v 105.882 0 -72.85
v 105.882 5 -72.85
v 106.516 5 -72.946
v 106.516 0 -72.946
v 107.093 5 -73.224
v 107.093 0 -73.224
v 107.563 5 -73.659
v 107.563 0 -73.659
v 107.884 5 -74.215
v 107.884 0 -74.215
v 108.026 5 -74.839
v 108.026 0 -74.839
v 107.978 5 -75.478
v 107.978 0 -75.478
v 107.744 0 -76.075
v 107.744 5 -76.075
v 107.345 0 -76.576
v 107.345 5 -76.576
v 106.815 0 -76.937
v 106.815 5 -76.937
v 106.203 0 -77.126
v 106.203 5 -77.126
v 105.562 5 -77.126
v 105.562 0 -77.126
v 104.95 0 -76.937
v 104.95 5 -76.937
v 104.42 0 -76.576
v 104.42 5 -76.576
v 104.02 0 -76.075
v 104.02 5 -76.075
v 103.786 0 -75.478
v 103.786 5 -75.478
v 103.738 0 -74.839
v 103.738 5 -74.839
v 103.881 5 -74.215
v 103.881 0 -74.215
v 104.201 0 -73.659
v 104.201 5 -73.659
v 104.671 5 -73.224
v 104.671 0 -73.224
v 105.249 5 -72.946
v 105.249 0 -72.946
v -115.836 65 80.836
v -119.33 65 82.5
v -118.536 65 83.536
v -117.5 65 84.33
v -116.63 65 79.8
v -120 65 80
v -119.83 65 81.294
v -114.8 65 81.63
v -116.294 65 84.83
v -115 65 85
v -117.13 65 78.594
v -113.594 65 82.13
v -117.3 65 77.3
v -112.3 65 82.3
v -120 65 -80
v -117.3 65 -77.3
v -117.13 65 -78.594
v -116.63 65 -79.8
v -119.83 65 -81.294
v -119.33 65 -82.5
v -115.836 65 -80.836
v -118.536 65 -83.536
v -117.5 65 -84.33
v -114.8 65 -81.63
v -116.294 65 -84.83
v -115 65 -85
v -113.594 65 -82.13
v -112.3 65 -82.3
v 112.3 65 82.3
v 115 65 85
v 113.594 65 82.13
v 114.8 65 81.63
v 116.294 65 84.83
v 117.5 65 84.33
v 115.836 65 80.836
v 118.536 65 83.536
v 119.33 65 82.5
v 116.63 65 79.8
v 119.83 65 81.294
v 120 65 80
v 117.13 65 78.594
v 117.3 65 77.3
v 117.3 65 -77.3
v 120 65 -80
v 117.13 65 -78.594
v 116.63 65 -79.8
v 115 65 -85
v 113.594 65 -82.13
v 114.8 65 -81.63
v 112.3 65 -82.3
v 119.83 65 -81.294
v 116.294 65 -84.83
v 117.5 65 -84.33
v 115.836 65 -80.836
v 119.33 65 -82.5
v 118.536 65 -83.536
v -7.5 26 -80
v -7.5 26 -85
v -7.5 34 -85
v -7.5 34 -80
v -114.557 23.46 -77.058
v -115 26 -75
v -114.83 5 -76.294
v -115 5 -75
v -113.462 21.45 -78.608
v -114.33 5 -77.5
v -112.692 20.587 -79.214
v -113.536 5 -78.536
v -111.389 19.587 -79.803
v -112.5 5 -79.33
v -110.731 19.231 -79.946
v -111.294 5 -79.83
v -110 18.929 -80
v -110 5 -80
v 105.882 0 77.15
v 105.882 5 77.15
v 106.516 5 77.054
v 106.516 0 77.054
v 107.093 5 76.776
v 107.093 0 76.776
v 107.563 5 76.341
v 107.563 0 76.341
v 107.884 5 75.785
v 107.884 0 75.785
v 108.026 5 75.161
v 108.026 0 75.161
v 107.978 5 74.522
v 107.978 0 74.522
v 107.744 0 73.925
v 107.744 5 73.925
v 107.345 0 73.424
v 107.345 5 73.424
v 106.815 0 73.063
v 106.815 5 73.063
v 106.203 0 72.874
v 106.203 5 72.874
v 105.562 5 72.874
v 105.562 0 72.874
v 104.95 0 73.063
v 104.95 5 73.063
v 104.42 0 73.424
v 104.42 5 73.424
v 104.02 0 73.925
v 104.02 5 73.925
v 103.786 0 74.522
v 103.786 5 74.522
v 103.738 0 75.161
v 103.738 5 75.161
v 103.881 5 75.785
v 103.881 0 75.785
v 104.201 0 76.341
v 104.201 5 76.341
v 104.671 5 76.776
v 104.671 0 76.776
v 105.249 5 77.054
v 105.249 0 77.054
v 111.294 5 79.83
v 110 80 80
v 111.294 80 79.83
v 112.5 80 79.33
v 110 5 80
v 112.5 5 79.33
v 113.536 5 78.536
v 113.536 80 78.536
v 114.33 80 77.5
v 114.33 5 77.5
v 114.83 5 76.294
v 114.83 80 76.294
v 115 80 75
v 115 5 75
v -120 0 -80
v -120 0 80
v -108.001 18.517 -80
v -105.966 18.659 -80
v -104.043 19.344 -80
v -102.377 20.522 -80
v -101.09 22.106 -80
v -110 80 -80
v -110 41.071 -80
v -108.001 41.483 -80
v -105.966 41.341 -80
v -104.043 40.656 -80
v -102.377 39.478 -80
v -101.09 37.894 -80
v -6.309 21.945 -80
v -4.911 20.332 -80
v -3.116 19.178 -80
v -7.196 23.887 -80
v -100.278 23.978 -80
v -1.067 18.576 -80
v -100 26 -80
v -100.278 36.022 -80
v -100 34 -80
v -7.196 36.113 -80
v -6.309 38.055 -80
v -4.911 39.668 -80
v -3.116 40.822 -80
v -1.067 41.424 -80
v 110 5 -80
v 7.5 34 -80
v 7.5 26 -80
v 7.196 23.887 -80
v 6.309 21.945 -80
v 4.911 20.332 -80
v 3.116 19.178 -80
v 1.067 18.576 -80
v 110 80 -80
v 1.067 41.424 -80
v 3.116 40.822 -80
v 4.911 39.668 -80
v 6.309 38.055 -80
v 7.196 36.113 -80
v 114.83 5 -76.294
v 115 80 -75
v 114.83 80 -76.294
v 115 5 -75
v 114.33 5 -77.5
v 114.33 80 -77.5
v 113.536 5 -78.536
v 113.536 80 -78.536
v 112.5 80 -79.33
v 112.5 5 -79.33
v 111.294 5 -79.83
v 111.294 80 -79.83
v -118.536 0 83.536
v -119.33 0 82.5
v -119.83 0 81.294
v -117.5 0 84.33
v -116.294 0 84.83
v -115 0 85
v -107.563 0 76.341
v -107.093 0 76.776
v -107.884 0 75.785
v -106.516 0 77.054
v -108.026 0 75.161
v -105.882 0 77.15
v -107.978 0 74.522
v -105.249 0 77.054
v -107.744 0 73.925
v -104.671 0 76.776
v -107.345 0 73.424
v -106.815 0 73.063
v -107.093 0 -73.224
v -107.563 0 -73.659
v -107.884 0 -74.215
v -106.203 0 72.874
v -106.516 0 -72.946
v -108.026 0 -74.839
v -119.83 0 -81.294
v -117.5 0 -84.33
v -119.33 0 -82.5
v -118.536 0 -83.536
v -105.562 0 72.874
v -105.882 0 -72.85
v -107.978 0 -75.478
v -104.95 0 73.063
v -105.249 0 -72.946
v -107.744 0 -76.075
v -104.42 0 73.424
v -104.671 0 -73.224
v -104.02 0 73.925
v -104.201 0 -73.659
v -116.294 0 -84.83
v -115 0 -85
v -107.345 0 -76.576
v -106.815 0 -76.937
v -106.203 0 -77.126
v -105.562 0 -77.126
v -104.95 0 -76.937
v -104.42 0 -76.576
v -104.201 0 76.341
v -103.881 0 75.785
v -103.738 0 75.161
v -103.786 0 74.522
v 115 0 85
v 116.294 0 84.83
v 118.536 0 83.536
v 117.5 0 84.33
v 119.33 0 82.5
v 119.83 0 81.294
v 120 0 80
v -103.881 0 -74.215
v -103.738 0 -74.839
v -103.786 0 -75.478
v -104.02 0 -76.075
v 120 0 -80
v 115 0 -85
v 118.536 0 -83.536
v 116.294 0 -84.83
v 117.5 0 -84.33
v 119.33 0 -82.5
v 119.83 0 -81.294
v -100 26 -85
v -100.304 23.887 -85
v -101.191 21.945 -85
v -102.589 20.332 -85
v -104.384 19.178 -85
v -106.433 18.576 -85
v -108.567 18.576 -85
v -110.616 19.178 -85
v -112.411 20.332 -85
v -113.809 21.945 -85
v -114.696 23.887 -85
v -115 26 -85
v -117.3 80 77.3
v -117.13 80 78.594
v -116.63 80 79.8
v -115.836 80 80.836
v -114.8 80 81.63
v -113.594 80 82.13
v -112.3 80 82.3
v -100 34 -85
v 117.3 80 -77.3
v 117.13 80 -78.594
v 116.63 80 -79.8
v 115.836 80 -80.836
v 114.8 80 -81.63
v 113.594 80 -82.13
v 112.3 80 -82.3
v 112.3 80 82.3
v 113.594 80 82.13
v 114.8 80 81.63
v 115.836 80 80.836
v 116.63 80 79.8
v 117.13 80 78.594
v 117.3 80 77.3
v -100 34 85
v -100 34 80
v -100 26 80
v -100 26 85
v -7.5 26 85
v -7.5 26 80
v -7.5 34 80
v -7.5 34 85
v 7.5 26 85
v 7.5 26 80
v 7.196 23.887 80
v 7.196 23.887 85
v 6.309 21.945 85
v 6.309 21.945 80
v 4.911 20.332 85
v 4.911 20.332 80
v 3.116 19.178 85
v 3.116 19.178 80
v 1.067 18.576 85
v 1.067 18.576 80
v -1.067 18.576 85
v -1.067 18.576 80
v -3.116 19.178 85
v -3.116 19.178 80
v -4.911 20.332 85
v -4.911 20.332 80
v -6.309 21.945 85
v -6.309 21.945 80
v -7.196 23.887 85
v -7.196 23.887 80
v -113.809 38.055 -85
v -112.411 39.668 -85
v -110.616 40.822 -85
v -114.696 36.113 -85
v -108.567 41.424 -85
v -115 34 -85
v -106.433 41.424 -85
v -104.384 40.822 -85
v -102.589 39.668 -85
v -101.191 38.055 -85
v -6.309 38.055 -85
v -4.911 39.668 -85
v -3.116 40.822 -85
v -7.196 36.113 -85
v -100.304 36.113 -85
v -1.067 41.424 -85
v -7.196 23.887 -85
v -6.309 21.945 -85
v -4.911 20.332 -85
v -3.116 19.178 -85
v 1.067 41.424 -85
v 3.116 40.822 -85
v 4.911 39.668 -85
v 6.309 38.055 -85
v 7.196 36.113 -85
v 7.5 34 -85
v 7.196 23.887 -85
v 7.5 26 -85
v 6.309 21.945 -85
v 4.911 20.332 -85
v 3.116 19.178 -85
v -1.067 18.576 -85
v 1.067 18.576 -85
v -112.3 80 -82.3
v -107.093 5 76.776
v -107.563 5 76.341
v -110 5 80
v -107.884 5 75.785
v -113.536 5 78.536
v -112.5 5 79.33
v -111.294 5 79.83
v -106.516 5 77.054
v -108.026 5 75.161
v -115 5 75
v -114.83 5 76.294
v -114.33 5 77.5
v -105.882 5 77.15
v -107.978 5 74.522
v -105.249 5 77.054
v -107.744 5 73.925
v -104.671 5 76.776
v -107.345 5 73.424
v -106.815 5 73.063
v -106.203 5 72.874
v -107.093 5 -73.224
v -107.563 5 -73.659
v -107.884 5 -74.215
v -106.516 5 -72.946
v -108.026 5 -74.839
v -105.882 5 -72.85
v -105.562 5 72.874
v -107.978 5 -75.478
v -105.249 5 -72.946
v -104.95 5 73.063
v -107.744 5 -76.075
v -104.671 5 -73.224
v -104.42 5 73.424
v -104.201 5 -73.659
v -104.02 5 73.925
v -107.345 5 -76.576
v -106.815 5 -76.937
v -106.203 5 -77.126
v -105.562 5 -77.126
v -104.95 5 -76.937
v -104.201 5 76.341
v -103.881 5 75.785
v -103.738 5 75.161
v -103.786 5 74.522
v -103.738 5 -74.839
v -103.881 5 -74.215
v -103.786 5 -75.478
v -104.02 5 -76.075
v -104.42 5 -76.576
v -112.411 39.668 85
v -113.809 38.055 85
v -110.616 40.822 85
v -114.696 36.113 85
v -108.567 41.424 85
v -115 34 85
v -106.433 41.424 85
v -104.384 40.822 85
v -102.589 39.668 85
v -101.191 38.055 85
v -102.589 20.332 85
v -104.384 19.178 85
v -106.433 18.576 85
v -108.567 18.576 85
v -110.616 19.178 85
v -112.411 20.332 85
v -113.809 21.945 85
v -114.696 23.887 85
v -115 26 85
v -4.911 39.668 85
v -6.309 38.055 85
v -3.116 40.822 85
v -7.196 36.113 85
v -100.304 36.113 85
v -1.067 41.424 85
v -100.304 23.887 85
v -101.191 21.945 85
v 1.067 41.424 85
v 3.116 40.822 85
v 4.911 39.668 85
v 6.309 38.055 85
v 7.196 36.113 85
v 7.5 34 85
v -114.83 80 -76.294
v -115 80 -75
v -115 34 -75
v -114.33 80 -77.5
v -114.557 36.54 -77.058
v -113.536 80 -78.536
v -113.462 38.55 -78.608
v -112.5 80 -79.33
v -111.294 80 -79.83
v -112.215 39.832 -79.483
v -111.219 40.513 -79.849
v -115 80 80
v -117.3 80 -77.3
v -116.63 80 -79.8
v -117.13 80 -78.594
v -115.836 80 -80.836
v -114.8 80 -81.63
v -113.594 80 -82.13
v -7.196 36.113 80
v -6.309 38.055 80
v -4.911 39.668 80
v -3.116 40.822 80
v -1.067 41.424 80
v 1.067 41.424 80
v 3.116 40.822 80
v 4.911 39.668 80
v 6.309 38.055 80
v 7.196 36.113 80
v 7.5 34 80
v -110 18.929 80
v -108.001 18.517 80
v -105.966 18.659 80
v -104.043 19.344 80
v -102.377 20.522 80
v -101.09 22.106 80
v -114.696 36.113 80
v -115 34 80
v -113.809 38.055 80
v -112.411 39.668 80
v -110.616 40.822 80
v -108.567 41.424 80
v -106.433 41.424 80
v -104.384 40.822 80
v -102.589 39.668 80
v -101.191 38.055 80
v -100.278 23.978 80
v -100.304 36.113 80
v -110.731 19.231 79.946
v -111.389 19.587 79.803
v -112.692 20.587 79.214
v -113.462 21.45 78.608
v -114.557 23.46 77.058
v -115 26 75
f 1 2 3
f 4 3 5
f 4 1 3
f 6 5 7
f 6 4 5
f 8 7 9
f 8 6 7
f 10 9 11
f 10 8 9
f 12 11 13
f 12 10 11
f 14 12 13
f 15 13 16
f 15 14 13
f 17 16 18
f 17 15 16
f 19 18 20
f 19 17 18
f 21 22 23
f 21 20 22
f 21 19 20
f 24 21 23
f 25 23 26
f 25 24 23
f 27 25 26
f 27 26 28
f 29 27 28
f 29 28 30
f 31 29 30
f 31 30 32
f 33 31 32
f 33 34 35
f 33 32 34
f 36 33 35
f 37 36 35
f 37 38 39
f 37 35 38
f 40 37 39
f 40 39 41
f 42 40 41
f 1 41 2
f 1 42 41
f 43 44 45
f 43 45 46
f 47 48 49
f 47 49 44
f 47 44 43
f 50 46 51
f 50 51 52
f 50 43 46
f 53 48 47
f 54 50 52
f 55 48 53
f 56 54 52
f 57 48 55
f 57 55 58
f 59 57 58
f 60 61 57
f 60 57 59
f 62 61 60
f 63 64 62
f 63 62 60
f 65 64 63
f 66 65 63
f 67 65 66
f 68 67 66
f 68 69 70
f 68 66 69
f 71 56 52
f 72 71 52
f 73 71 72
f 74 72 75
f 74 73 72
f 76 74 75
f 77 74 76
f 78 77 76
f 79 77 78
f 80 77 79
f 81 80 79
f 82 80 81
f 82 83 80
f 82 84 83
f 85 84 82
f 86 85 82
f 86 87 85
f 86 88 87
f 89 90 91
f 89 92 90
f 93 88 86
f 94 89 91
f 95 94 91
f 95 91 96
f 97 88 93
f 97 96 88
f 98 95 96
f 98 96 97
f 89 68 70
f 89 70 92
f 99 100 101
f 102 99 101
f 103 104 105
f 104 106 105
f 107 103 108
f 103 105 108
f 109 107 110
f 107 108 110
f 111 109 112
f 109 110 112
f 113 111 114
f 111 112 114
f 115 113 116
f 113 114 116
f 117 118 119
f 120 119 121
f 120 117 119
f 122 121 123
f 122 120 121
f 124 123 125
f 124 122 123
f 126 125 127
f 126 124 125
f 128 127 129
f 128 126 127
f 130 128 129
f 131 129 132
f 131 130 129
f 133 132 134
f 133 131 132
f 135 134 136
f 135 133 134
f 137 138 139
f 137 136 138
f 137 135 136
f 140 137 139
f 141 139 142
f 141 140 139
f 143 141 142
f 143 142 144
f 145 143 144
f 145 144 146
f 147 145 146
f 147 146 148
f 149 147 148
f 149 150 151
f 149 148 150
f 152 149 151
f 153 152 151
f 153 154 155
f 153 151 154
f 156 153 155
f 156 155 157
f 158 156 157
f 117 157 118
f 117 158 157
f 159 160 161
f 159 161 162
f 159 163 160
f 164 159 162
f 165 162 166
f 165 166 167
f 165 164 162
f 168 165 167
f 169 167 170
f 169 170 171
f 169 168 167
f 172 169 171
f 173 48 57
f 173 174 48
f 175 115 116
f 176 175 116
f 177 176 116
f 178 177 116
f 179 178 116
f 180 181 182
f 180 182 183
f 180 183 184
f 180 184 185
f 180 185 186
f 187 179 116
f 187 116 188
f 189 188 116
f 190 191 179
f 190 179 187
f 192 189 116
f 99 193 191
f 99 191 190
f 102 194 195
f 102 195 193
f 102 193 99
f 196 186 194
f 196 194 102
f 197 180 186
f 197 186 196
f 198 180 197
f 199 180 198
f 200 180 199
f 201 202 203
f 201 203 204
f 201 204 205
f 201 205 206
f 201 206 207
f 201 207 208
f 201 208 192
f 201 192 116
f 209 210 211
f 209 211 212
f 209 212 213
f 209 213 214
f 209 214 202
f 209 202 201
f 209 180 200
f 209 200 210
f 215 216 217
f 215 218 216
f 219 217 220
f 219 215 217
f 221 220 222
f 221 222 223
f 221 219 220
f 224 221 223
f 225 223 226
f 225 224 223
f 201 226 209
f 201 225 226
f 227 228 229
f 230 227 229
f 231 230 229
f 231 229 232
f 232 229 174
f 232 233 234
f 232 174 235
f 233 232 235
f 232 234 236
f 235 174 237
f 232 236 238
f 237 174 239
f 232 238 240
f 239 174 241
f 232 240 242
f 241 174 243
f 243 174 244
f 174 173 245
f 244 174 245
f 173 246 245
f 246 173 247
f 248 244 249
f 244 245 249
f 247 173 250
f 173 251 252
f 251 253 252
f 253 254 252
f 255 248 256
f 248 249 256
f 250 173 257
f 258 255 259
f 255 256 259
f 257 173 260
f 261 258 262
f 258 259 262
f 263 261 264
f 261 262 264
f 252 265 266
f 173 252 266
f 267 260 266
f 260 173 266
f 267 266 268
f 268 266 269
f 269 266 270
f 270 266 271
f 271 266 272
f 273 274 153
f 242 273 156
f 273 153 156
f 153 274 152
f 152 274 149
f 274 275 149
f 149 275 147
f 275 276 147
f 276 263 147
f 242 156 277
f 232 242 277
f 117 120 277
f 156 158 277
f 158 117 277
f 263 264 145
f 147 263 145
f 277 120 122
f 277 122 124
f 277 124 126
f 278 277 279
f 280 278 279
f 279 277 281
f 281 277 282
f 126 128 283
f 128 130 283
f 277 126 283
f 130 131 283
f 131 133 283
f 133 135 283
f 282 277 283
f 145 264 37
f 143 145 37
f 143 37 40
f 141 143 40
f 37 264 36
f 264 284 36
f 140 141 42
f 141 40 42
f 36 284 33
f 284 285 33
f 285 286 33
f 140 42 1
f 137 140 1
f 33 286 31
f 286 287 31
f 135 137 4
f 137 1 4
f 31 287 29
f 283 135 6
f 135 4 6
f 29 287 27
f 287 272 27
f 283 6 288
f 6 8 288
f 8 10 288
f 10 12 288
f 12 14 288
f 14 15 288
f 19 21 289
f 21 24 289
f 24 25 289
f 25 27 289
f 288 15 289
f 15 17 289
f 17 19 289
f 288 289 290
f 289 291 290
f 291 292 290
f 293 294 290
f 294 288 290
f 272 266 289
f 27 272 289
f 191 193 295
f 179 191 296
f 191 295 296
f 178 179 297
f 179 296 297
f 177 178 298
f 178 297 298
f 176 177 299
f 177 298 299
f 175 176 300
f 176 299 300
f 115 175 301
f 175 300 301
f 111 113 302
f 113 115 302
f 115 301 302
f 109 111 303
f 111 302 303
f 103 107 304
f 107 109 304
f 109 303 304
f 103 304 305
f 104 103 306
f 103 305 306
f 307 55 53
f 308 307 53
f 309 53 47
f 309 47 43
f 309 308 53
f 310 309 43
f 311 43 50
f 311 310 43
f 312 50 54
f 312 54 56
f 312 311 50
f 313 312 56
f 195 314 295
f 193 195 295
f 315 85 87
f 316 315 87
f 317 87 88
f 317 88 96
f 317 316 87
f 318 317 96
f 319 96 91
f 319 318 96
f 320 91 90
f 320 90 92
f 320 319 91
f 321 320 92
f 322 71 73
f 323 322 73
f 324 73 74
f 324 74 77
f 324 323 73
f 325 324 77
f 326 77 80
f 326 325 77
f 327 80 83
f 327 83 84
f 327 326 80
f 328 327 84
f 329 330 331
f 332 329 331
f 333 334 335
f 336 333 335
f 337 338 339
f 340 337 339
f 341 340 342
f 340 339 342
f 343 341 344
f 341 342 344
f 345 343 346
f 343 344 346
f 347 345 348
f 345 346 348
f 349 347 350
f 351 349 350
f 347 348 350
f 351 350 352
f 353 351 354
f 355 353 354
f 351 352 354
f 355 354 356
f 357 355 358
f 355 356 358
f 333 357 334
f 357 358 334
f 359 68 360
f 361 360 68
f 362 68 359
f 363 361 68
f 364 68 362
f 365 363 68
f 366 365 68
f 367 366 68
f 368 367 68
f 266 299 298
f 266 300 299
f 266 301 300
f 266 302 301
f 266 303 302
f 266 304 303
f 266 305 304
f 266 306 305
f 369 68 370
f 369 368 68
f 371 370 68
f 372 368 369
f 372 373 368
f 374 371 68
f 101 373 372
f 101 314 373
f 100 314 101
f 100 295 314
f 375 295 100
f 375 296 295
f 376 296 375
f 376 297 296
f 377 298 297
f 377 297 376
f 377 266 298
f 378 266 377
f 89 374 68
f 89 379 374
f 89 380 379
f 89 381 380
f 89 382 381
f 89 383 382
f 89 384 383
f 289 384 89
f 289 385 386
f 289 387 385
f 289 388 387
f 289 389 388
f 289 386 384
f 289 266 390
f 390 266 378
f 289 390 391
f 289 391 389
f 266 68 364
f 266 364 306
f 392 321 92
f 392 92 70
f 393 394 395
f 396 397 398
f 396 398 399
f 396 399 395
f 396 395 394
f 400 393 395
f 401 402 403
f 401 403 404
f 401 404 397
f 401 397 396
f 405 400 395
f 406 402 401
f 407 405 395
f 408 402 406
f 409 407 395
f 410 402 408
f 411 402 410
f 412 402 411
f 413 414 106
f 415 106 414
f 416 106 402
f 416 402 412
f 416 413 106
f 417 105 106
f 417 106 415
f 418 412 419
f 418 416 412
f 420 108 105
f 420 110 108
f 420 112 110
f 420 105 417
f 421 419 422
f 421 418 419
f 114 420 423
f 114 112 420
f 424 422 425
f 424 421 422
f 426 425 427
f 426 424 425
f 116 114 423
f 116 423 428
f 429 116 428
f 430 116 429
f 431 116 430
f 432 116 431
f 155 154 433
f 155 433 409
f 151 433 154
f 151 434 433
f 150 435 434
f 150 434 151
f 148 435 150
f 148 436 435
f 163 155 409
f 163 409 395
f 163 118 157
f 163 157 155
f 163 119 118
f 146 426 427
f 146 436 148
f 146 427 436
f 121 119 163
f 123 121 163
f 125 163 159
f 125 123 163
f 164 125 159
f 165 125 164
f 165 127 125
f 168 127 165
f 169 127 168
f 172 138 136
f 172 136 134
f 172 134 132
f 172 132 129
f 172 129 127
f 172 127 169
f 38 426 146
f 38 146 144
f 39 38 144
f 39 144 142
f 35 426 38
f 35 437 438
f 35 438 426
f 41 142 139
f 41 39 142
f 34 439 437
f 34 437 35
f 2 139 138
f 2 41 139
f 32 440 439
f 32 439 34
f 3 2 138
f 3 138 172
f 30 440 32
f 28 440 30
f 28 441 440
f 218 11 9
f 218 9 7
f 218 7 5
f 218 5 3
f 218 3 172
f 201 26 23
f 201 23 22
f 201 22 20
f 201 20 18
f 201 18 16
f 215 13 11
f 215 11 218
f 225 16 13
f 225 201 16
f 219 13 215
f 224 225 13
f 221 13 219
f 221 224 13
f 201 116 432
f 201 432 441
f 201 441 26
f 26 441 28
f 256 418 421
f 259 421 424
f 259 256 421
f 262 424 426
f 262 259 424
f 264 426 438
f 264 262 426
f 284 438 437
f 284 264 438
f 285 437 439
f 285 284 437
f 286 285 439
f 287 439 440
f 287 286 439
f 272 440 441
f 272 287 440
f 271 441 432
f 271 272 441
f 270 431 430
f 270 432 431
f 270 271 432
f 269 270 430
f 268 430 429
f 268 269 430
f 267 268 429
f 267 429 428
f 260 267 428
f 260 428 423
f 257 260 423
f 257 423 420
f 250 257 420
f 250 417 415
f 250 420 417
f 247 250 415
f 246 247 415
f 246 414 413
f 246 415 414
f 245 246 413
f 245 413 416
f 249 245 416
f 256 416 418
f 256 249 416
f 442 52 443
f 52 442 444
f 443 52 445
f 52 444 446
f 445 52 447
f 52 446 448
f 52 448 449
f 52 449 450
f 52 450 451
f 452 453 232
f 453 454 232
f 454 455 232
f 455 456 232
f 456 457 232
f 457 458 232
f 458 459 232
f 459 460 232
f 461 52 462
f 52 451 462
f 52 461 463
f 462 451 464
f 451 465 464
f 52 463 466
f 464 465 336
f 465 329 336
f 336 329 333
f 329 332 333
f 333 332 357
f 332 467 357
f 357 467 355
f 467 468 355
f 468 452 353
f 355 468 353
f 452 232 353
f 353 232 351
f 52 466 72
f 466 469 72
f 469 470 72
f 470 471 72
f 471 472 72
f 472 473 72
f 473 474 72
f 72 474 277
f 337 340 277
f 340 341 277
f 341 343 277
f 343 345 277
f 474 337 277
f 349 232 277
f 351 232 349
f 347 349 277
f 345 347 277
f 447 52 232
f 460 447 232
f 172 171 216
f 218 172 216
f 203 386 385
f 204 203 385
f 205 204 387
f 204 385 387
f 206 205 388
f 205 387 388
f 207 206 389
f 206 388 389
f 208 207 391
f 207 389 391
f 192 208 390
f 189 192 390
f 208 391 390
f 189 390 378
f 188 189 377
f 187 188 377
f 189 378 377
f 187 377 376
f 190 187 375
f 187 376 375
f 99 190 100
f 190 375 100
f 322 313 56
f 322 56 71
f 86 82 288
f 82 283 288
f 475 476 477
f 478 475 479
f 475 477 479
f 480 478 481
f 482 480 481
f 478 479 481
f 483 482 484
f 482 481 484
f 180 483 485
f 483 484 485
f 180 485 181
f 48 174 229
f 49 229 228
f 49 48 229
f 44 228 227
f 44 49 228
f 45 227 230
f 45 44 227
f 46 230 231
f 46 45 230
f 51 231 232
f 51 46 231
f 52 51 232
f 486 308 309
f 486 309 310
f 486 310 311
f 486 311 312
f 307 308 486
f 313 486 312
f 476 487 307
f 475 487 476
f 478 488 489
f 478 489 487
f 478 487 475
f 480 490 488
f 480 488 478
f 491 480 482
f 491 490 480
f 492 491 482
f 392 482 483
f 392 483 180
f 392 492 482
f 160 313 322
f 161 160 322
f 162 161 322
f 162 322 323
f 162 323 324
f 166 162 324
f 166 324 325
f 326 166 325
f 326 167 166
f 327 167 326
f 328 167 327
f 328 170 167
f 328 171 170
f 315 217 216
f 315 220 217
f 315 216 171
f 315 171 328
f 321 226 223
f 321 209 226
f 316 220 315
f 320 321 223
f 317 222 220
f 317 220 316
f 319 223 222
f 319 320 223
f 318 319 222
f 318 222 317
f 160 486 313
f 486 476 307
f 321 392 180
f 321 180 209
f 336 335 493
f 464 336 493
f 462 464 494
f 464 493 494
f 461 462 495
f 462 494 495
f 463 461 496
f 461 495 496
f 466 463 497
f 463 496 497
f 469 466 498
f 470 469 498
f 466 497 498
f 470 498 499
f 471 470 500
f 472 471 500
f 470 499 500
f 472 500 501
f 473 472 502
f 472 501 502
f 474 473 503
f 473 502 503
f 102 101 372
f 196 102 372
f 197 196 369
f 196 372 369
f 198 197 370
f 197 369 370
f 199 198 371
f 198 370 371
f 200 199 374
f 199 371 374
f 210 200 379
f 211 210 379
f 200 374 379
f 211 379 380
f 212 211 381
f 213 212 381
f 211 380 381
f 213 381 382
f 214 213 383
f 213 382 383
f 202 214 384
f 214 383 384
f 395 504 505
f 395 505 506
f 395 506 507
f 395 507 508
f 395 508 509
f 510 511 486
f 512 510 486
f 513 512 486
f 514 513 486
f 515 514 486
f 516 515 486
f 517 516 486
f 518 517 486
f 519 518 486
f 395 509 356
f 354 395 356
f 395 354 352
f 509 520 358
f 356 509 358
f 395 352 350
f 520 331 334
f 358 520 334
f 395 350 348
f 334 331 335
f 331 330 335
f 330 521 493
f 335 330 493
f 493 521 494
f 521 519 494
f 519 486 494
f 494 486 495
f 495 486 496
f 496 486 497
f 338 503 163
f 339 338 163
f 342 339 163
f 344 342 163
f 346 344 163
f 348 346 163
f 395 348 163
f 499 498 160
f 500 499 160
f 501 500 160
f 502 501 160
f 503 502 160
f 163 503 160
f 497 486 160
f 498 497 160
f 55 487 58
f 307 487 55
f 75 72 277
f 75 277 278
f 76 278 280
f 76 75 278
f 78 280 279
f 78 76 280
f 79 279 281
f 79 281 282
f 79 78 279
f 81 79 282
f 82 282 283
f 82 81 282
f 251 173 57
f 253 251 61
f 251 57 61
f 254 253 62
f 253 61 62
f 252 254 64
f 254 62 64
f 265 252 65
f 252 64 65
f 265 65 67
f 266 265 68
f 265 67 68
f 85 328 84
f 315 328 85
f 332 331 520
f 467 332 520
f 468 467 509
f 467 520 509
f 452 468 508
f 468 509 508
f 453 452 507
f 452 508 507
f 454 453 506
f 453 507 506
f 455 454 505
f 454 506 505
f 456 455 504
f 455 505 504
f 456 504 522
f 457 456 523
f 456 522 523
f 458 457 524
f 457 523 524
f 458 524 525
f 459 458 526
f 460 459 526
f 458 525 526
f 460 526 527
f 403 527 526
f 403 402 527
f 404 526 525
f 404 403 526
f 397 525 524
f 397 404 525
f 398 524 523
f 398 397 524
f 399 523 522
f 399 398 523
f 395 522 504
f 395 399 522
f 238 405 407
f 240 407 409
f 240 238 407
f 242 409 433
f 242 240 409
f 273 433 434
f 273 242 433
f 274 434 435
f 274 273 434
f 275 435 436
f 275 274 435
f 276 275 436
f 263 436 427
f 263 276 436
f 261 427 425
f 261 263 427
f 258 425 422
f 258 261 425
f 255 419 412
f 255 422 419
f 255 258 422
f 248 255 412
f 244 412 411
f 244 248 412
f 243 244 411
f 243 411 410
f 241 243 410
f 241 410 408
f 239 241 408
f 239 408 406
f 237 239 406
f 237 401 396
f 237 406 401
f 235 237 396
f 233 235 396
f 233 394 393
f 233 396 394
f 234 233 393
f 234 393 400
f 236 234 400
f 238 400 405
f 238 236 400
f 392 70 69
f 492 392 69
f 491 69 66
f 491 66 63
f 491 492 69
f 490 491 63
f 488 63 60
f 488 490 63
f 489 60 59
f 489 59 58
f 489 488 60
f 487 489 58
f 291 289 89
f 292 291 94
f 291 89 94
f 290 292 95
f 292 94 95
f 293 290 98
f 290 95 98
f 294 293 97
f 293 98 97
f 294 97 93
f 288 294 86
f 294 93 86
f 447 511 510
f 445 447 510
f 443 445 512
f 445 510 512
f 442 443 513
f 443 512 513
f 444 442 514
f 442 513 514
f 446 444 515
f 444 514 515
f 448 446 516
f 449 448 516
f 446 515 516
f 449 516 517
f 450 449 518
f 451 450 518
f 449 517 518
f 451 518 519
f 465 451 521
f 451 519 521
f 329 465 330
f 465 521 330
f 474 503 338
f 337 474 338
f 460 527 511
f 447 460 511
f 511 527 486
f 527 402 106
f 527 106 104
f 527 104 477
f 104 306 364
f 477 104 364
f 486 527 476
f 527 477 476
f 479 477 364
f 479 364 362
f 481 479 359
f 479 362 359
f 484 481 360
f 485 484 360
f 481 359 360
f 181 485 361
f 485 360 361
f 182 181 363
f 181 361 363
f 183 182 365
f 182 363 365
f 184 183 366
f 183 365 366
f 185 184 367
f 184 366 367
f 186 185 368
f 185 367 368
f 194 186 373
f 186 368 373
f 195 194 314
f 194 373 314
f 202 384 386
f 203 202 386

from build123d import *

# Parameters (mm, degrees)
SKETCH_1_W               = 240
SKETCH_1_H               = 170
SKETCH_1_R               = 2.15
EXTRUDE_1_DEPTH          = 80
SKETCH_2_W               = 230
SKETCH_2_H               = 160
CUT_EXTRUDE_1_DEPTH      = 75
CUT_EXTRUDE_3_DEPTH      = 220.146070008
CUT_EXTRUDE_3_DEPTH_BACK = 220.146070008
FILLET_1_R               = 5
SKETCH_12_W              = 244.6
SKETCH_12_H              = 174.6
CUT_EXTRUDE_5_DEPTH      = 15


with BuildPart() as part:
    # 草图1 → 凸台-拉伸1 (new body)
    with BuildSketch(Plane(origin=(0, 0, 0), x_dir=(1, 0, 0), z_dir=(0, 1, 0))):
        Rectangle(SKETCH_1_W, SKETCH_1_H)
        with Locations(Location((-105.882352941, 75, 0), (0, 0, 270))):
            Circle(SKETCH_1_R, mode=Mode.SUBTRACT)
        with Locations(Location((105.882352941, 75, 0), (0, 0, 270))):
            Circle(SKETCH_1_R, mode=Mode.SUBTRACT)
        with Locations(Location((105.882352941, -75, 0), (0, 0, 270))):
            Circle(SKETCH_1_R, mode=Mode.SUBTRACT)
        with Locations(Location((-105.882352941, -75, 0), (0, 0, 270))):
            Circle(SKETCH_1_R, mode=Mode.SUBTRACT)
    extrude(amount=EXTRUDE_1_DEPTH)

    # 草图2 → 切除-拉伸1 (cut)
    with BuildSketch(Plane(origin=(0, 80, 0), x_dir=(1, 0, 0), z_dir=(0, 1, 0))):
        Rectangle(SKETCH_2_W, SKETCH_2_H)
    extrude(amount=-CUT_EXTRUDE_1_DEPTH, mode=Mode.SUBTRACT)

    # 草图9 → 切除-拉伸3 (cut, two sides: drawn at the far end of the back side and taken through both)
    with BuildSketch(Plane.XY.offset(-80).offset(-CUT_EXTRUDE_3_DEPTH_BACK)):
        with BuildLine():
            Line((-115, 26), (-115, 34))
            ThreePointArc((-115, 34), (-107.5, 41.5), (-100, 34))
            Line((-100, 34), (-100, 26))
            ThreePointArc((-100, 26), (-107.5, 18.5), (-115, 26))
        make_face()
        with BuildLine():
            Line((-7.5, 26), (-7.5, 34))
            ThreePointArc((-7.5, 34), (0, 41.5), (7.5, 34))
            Line((7.5, 34), (7.5, 26))
            ThreePointArc((7.5, 26), (0, 18.5), (-7.5, 26))
        make_face()
    extrude(amount=CUT_EXTRUDE_3_DEPTH + CUT_EXTRUDE_3_DEPTH_BACK, mode=Mode.SUBTRACT)

    # 圆角1
    fillet_1_edges = [part.edges().sort_by_distance(p)[0] for p in [
        (-115, 15.5, 80),
        (-115, 15.5, -80),
        (115, 42.5, -80),
        (115, 42.5, 80),
        (-115, 57, -80),
        (120, 40, 85),
        (-120, 40, 85),
        (-120, 40, -85),
        (120, 40, -85),
    ]]
    fillet(fillet_1_edges, radius=FILLET_1_R - 0.0001)  # a hair under: the kernel refuses the full size

    # 草图12 → 切除-拉伸5 (cut)
    # profile 1 of 2: a face of its own
    with BuildSketch(Plane(origin=(0, 80, 0), x_dir=(1, 0, 0), z_dir=(0, 1, 0))):
        Rectangle(SKETCH_12_W, SKETCH_12_H)
        with BuildLine():
            Line((115, 85), (-115, 85))
            ThreePointArc((-115, 85), (-118.535533906, 83.535533906), (-120, 80))
            Line((-120, 80), (-120, -80))
            ThreePointArc((-120, -80), (-118.535533906, -83.535533906), (-115, -85))
            Line((-115, -85), (115, -85))
            ThreePointArc((115, -85), (118.535533906, -83.535533906), (120, -80))
            Line((120, -80), (120, 80))
            ThreePointArc((120, 80), (118.535533906, 83.535533906), (115, 85))
        make_face(mode=Mode.SUBTRACT)
    # profile 2 of 2: a face of its own
    with BuildSketch(Plane(origin=(0, 80, 0), x_dir=(1, 0, 0), z_dir=(0, 1, 0))):
        with BuildLine():
            ThreePointArc((120, 80), (118.535533906, 83.535533906), (115, 85))
            Line((115, 85), (-115, 85))
            ThreePointArc((-115, 85), (-118.535533906, 83.535533906), (-120, 80))
            Line((-120, 80), (-120, -80))
            ThreePointArc((-120, -80), (-118.535533906, -83.535533906), (-115, -85))
            Line((-115, -85), (115, -85))
            ThreePointArc((115, -85), (118.535533906, -83.535533906), (120, -80))
            Line((120, -80), (120, 80))
        make_face()
        with BuildLine():
            ThreePointArc((-112.3, 82.3), (-115.835533906, 80.835533906), (-117.3, 77.3))
            Line((-117.3, 77.3), (-117.3, -77.3))
            ThreePointArc((-117.3, -77.3), (-115.835533906, -80.835533906), (-112.3, -82.3))
            Line((-112.3, -82.3), (112.3, -82.3))
            ThreePointArc((112.3, -82.3), (115.835533906, -80.835533906), (117.3, -77.3))
            Line((117.3, -77.3), (117.3, 77.3))
            ThreePointArc((117.3, 77.3), (115.835533906, 80.835533906), (112.3, 82.3))
            Line((112.3, 82.3), (-112.3, 82.3))
        make_face(mode=Mode.SUBTRACT)
    extrude(amount=-CUT_EXTRUDE_5_DEPTH, mode=Mode.SUBTRACT)


solid = part.part
